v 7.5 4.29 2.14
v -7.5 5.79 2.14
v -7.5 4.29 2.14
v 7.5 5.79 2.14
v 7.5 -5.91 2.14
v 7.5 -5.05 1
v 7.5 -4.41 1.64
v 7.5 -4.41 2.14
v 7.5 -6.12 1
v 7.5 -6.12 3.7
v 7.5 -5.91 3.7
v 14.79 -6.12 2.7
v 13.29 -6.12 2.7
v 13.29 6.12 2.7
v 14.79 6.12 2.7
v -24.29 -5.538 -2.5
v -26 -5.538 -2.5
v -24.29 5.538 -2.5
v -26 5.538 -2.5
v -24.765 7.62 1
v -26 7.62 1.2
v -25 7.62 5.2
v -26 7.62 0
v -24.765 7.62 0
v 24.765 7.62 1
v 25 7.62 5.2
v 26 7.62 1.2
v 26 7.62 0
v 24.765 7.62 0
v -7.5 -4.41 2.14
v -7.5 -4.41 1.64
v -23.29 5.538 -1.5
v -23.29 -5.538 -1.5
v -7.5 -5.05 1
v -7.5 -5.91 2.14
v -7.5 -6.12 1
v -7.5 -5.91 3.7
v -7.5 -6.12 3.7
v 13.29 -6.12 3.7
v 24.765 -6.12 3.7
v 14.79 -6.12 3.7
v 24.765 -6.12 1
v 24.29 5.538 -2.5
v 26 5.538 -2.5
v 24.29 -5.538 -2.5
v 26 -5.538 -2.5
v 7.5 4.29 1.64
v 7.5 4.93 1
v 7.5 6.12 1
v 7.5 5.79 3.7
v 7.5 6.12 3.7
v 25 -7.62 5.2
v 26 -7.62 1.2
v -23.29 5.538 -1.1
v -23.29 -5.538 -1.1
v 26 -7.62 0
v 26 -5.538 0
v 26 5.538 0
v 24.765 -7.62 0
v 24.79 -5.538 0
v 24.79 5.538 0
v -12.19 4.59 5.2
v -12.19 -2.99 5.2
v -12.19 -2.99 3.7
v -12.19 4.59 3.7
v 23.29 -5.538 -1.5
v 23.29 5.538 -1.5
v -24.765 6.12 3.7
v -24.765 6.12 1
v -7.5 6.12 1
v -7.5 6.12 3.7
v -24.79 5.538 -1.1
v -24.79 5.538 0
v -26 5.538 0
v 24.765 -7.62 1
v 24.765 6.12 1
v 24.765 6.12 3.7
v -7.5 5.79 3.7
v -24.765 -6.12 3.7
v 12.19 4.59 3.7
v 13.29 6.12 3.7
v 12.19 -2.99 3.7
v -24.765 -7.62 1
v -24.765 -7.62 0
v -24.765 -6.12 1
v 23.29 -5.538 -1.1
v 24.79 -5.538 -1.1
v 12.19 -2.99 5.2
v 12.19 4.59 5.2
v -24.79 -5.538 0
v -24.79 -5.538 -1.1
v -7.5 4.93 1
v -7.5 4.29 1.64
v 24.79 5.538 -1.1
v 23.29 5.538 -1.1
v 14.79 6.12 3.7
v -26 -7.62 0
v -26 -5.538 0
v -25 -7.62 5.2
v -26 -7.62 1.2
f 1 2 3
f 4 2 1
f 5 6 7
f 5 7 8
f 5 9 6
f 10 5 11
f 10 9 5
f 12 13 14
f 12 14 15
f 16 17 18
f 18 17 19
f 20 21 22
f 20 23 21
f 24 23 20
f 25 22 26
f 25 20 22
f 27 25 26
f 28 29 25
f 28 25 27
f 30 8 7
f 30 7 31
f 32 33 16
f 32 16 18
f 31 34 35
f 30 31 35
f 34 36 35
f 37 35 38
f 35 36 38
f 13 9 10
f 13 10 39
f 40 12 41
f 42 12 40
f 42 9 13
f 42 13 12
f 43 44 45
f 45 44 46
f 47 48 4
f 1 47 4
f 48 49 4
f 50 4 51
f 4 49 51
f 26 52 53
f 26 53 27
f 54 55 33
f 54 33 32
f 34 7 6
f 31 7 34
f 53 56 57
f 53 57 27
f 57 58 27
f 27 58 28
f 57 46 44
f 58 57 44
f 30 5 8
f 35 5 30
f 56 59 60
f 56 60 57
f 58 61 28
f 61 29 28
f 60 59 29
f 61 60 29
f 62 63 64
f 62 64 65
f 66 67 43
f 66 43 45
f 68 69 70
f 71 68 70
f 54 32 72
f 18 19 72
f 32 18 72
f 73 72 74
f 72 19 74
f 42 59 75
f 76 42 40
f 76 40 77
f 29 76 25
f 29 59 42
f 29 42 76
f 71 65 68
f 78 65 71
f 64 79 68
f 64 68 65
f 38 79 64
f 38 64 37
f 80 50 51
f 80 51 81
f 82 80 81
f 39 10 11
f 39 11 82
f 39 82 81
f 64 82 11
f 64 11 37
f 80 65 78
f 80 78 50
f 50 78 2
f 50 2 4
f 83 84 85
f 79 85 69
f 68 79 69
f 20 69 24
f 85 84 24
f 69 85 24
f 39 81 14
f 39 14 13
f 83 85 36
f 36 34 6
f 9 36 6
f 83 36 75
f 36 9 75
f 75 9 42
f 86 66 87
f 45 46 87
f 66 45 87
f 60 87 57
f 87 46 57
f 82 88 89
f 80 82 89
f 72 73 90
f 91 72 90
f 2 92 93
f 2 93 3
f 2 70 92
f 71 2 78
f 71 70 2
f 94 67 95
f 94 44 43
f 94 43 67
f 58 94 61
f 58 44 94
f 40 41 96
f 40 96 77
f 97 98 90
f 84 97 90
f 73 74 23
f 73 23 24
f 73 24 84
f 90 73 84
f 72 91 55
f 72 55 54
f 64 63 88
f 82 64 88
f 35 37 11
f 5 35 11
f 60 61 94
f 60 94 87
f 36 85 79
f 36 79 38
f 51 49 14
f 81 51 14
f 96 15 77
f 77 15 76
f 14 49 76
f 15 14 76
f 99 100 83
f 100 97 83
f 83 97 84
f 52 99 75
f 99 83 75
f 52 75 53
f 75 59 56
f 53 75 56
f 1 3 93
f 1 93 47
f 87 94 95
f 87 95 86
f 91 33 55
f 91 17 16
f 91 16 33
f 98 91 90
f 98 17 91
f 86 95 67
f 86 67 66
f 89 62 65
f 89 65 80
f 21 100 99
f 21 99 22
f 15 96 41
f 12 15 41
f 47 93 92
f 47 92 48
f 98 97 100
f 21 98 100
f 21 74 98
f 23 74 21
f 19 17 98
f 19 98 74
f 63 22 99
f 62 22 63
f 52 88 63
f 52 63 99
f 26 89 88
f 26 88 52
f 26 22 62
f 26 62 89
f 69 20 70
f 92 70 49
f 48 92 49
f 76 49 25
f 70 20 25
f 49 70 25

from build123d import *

# Parameters (mm, degrees)
SKETCH_W         = 52
SKETCH_H         = 15.24
PAD_DEPTH        = 5.2
CHAMFER_SIZE2    = 1
CHAMFER_SIZE     = 4
CHAMFER001_SIZE2 = 4
CHAMFER001_SIZE  = 1
SKETCH001_W      = 49.53
SKETCH001_H      = 12.24
POCKET_DEPTH     = 3.7
SKETCH002_W      = 1.21
SKETCH002_H      = 11.076
PAD001_DEPTH     = 2.5
SKETCH003_W      = 11.076
SKETCH003_H      = 1.4
PAD002_DEPTH     = 1.5
CHAMFER002_SIZE  = 1
SKETCH004_W      = 11.076
SKETCH004_H      = 1.4
PAD003_DEPTH     = 1.5
CHAMFER003_SIZE  = 1
SKETCH005_W      = 24.38
SKETCH005_H      = 7.58
POCKET001_DEPTH  = 1.5
SKETCH006_W      = 15
SKETCH006_H      = 1.5
PAD004_DEPTH     = 3.06
SKETCH007_W      = 1.5
SKETCH007_H      = 13
PAD005_DEPTH     = 1
SKETCH008_W      = 15
SKETCH008_H      = 1.5
PAD006_DEPTH     = 1.5
CHAMFER004_SIZE  = 1
SKETCH009_W      = 15
SKETCH009_H      = 1.5
PAD007_DEPTH     = 1.5
CHAMFER005_SIZE  = 1
SKETCH010_W      = 49.53
SKETCH010_H      = 15.24
POCKET002_DEPTH  = 1


with BuildPart() as part:
    # Sketch → Pad (new body)
    with BuildSketch(Plane.XY):
        Rectangle(SKETCH_W, SKETCH_H)
    extrude(amount=PAD_DEPTH)

    # Chamfer
    chamfer_edges = [part.edges().sort_by_distance(p)[0] for p in [
        (26, 0, 5.2),
    ]]
    chamfer_side = part.faces().sort_by_distance((26, 0, 2.6))[0]
    chamfer(chamfer_edges, length=CHAMFER_SIZE, length2=CHAMFER_SIZE2, reference=chamfer_side)

    # Chamfer001
    chamfer001_edges = [part.edges().sort_by_distance(p)[0] for p in [
        (-26, 0, 5.2),
    ]]
    chamfer001_side = part.faces().sort_by_distance((-0.5, 0, 5.2))[0]
    chamfer(chamfer001_edges, length=CHAMFER001_SIZE, length2=CHAMFER001_SIZE2, reference=chamfer001_side)

    # Sketch001 (on Face7 of Chamfer001) → Pocket (cut)
    with BuildSketch(Plane(origin=(0, 0, 0), x_dir=(1, 0, 0), z_dir=(0, 0, -1))):
        Rectangle(SKETCH001_W, SKETCH001_H)
    extrude(amount=-POCKET_DEPTH, mode=Mode.SUBTRACT)

    # Sketch002 (on Face7 of Pocket) → Pad001 (join)
    with BuildSketch(Plane(origin=(0, 0, 0), x_dir=(1, 0, 0), z_dir=(0, 0, -1))):
        with Locations((-25.395, 0)):
            Rectangle(SKETCH002_W, SKETCH002_H)
        with Locations((25.395, 0)):
            Rectangle(SKETCH002_W, SKETCH002_H)
    extrude(amount=PAD001_DEPTH)

    # Sketch003 (on Face15 of Pad001) → Pad002 (join)
    with BuildSketch(Plane.YZ.offset(-24.79)):
        with Locations((0, -1.8)):
            Rectangle(SKETCH003_W, SKETCH003_H)
    extrude(amount=PAD002_DEPTH)

    # Chamfer002
    chamfer002_edges = [part.edges().sort_by_distance(p)[0] for p in [
        (-23.29, 0, -2.5),
    ]]
    chamfer(chamfer002_edges, length=CHAMFER002_SIZE)

    # Sketch004 (on Face17 of Chamfer002) → Pad003 (join)
    with BuildSketch(Plane(origin=(24.79, 0, 0), x_dir=(0, -1, 0), z_dir=(-1, 0, 0))):
        with Locations((0, -1.8)):
            Rectangle(SKETCH004_W, SKETCH004_H)
    extrude(amount=PAD003_DEPTH)

    # Chamfer003
    chamfer003_edges = [part.edges().sort_by_distance(p)[0] for p in [
        (23.29, 0, -2.5),
    ]]
    chamfer(chamfer003_edges, length=CHAMFER003_SIZE)

    # Sketch005 (on Face25 of Chamfer003) → Pocket001 (cut)
    with BuildSketch(Plane.XY.offset(5.2)):
        with Locations((0, 0.8)):
            Rectangle(SKETCH005_W, SKETCH005_H)
    extrude(amount=-POCKET001_DEPTH, mode=Mode.SUBTRACT)

    # Sketch006 (on Face32 of Pocket001) → Pad004 (join)
    with BuildSketch(Plane(origin=(0, 0, 3.7), x_dir=(1, 0, 0), z_dir=(0, 0, -1))):
        with Locations((0, 6.66)):
            Rectangle(SKETCH006_W, SKETCH006_H)
        with Locations((0, -6.54)):
            Rectangle(SKETCH006_W, SKETCH006_H)
    extrude(amount=PAD004_DEPTH)

    # Sketch007 (on Face32 of Pad004) → Pad005 (join)
    with BuildSketch(Plane(origin=(0, 0, 3.7), x_dir=(1, 0, 0), z_dir=(0, 0, -1))):
        with Locations((14.04, 0)):
            Rectangle(SKETCH007_W, SKETCH007_H)
    extrude(amount=PAD005_DEPTH)

    # Sketch008 (on Face51 of Pad005) → Pad006 (join)
    with BuildSketch(Plane(origin=(0, -5.91, 0), x_dir=(-1, 0, 0), z_dir=(0, 1, 0))):
        with Locations((0, 1.39)):
            Rectangle(SKETCH008_W, SKETCH008_H)
    extrude(amount=PAD006_DEPTH)

    # Chamfer004
    chamfer004_edges = [part.edges().sort_by_distance(p)[0] for p in [
        (0, -4.41, 0.64),
    ]]
    chamfer(chamfer004_edges, length=CHAMFER004_SIZE)

    # Sketch009 (on Face15 of Chamfer004) → Pad007 (join)
    with BuildSketch(Plane.XZ.offset(-5.79)):
        with Locations((0, 1.39)):
            Rectangle(SKETCH009_W, SKETCH009_H)
    extrude(amount=PAD007_DEPTH)

    # Chamfer005
    chamfer005_edges = [part.edges().sort_by_distance(p)[0] for p in [
        (0, 4.29, 0.64),
    ]]
    chamfer(chamfer005_edges, length=CHAMFER005_SIZE)

    # Sketch010 → Pocket002 (cut)
    with BuildSketch(Plane.XY):
        Rectangle(SKETCH010_W, SKETCH010_H)
    extrude(amount=POCKET002_DEPTH, mode=Mode.SUBTRACT)


solid = part.part
